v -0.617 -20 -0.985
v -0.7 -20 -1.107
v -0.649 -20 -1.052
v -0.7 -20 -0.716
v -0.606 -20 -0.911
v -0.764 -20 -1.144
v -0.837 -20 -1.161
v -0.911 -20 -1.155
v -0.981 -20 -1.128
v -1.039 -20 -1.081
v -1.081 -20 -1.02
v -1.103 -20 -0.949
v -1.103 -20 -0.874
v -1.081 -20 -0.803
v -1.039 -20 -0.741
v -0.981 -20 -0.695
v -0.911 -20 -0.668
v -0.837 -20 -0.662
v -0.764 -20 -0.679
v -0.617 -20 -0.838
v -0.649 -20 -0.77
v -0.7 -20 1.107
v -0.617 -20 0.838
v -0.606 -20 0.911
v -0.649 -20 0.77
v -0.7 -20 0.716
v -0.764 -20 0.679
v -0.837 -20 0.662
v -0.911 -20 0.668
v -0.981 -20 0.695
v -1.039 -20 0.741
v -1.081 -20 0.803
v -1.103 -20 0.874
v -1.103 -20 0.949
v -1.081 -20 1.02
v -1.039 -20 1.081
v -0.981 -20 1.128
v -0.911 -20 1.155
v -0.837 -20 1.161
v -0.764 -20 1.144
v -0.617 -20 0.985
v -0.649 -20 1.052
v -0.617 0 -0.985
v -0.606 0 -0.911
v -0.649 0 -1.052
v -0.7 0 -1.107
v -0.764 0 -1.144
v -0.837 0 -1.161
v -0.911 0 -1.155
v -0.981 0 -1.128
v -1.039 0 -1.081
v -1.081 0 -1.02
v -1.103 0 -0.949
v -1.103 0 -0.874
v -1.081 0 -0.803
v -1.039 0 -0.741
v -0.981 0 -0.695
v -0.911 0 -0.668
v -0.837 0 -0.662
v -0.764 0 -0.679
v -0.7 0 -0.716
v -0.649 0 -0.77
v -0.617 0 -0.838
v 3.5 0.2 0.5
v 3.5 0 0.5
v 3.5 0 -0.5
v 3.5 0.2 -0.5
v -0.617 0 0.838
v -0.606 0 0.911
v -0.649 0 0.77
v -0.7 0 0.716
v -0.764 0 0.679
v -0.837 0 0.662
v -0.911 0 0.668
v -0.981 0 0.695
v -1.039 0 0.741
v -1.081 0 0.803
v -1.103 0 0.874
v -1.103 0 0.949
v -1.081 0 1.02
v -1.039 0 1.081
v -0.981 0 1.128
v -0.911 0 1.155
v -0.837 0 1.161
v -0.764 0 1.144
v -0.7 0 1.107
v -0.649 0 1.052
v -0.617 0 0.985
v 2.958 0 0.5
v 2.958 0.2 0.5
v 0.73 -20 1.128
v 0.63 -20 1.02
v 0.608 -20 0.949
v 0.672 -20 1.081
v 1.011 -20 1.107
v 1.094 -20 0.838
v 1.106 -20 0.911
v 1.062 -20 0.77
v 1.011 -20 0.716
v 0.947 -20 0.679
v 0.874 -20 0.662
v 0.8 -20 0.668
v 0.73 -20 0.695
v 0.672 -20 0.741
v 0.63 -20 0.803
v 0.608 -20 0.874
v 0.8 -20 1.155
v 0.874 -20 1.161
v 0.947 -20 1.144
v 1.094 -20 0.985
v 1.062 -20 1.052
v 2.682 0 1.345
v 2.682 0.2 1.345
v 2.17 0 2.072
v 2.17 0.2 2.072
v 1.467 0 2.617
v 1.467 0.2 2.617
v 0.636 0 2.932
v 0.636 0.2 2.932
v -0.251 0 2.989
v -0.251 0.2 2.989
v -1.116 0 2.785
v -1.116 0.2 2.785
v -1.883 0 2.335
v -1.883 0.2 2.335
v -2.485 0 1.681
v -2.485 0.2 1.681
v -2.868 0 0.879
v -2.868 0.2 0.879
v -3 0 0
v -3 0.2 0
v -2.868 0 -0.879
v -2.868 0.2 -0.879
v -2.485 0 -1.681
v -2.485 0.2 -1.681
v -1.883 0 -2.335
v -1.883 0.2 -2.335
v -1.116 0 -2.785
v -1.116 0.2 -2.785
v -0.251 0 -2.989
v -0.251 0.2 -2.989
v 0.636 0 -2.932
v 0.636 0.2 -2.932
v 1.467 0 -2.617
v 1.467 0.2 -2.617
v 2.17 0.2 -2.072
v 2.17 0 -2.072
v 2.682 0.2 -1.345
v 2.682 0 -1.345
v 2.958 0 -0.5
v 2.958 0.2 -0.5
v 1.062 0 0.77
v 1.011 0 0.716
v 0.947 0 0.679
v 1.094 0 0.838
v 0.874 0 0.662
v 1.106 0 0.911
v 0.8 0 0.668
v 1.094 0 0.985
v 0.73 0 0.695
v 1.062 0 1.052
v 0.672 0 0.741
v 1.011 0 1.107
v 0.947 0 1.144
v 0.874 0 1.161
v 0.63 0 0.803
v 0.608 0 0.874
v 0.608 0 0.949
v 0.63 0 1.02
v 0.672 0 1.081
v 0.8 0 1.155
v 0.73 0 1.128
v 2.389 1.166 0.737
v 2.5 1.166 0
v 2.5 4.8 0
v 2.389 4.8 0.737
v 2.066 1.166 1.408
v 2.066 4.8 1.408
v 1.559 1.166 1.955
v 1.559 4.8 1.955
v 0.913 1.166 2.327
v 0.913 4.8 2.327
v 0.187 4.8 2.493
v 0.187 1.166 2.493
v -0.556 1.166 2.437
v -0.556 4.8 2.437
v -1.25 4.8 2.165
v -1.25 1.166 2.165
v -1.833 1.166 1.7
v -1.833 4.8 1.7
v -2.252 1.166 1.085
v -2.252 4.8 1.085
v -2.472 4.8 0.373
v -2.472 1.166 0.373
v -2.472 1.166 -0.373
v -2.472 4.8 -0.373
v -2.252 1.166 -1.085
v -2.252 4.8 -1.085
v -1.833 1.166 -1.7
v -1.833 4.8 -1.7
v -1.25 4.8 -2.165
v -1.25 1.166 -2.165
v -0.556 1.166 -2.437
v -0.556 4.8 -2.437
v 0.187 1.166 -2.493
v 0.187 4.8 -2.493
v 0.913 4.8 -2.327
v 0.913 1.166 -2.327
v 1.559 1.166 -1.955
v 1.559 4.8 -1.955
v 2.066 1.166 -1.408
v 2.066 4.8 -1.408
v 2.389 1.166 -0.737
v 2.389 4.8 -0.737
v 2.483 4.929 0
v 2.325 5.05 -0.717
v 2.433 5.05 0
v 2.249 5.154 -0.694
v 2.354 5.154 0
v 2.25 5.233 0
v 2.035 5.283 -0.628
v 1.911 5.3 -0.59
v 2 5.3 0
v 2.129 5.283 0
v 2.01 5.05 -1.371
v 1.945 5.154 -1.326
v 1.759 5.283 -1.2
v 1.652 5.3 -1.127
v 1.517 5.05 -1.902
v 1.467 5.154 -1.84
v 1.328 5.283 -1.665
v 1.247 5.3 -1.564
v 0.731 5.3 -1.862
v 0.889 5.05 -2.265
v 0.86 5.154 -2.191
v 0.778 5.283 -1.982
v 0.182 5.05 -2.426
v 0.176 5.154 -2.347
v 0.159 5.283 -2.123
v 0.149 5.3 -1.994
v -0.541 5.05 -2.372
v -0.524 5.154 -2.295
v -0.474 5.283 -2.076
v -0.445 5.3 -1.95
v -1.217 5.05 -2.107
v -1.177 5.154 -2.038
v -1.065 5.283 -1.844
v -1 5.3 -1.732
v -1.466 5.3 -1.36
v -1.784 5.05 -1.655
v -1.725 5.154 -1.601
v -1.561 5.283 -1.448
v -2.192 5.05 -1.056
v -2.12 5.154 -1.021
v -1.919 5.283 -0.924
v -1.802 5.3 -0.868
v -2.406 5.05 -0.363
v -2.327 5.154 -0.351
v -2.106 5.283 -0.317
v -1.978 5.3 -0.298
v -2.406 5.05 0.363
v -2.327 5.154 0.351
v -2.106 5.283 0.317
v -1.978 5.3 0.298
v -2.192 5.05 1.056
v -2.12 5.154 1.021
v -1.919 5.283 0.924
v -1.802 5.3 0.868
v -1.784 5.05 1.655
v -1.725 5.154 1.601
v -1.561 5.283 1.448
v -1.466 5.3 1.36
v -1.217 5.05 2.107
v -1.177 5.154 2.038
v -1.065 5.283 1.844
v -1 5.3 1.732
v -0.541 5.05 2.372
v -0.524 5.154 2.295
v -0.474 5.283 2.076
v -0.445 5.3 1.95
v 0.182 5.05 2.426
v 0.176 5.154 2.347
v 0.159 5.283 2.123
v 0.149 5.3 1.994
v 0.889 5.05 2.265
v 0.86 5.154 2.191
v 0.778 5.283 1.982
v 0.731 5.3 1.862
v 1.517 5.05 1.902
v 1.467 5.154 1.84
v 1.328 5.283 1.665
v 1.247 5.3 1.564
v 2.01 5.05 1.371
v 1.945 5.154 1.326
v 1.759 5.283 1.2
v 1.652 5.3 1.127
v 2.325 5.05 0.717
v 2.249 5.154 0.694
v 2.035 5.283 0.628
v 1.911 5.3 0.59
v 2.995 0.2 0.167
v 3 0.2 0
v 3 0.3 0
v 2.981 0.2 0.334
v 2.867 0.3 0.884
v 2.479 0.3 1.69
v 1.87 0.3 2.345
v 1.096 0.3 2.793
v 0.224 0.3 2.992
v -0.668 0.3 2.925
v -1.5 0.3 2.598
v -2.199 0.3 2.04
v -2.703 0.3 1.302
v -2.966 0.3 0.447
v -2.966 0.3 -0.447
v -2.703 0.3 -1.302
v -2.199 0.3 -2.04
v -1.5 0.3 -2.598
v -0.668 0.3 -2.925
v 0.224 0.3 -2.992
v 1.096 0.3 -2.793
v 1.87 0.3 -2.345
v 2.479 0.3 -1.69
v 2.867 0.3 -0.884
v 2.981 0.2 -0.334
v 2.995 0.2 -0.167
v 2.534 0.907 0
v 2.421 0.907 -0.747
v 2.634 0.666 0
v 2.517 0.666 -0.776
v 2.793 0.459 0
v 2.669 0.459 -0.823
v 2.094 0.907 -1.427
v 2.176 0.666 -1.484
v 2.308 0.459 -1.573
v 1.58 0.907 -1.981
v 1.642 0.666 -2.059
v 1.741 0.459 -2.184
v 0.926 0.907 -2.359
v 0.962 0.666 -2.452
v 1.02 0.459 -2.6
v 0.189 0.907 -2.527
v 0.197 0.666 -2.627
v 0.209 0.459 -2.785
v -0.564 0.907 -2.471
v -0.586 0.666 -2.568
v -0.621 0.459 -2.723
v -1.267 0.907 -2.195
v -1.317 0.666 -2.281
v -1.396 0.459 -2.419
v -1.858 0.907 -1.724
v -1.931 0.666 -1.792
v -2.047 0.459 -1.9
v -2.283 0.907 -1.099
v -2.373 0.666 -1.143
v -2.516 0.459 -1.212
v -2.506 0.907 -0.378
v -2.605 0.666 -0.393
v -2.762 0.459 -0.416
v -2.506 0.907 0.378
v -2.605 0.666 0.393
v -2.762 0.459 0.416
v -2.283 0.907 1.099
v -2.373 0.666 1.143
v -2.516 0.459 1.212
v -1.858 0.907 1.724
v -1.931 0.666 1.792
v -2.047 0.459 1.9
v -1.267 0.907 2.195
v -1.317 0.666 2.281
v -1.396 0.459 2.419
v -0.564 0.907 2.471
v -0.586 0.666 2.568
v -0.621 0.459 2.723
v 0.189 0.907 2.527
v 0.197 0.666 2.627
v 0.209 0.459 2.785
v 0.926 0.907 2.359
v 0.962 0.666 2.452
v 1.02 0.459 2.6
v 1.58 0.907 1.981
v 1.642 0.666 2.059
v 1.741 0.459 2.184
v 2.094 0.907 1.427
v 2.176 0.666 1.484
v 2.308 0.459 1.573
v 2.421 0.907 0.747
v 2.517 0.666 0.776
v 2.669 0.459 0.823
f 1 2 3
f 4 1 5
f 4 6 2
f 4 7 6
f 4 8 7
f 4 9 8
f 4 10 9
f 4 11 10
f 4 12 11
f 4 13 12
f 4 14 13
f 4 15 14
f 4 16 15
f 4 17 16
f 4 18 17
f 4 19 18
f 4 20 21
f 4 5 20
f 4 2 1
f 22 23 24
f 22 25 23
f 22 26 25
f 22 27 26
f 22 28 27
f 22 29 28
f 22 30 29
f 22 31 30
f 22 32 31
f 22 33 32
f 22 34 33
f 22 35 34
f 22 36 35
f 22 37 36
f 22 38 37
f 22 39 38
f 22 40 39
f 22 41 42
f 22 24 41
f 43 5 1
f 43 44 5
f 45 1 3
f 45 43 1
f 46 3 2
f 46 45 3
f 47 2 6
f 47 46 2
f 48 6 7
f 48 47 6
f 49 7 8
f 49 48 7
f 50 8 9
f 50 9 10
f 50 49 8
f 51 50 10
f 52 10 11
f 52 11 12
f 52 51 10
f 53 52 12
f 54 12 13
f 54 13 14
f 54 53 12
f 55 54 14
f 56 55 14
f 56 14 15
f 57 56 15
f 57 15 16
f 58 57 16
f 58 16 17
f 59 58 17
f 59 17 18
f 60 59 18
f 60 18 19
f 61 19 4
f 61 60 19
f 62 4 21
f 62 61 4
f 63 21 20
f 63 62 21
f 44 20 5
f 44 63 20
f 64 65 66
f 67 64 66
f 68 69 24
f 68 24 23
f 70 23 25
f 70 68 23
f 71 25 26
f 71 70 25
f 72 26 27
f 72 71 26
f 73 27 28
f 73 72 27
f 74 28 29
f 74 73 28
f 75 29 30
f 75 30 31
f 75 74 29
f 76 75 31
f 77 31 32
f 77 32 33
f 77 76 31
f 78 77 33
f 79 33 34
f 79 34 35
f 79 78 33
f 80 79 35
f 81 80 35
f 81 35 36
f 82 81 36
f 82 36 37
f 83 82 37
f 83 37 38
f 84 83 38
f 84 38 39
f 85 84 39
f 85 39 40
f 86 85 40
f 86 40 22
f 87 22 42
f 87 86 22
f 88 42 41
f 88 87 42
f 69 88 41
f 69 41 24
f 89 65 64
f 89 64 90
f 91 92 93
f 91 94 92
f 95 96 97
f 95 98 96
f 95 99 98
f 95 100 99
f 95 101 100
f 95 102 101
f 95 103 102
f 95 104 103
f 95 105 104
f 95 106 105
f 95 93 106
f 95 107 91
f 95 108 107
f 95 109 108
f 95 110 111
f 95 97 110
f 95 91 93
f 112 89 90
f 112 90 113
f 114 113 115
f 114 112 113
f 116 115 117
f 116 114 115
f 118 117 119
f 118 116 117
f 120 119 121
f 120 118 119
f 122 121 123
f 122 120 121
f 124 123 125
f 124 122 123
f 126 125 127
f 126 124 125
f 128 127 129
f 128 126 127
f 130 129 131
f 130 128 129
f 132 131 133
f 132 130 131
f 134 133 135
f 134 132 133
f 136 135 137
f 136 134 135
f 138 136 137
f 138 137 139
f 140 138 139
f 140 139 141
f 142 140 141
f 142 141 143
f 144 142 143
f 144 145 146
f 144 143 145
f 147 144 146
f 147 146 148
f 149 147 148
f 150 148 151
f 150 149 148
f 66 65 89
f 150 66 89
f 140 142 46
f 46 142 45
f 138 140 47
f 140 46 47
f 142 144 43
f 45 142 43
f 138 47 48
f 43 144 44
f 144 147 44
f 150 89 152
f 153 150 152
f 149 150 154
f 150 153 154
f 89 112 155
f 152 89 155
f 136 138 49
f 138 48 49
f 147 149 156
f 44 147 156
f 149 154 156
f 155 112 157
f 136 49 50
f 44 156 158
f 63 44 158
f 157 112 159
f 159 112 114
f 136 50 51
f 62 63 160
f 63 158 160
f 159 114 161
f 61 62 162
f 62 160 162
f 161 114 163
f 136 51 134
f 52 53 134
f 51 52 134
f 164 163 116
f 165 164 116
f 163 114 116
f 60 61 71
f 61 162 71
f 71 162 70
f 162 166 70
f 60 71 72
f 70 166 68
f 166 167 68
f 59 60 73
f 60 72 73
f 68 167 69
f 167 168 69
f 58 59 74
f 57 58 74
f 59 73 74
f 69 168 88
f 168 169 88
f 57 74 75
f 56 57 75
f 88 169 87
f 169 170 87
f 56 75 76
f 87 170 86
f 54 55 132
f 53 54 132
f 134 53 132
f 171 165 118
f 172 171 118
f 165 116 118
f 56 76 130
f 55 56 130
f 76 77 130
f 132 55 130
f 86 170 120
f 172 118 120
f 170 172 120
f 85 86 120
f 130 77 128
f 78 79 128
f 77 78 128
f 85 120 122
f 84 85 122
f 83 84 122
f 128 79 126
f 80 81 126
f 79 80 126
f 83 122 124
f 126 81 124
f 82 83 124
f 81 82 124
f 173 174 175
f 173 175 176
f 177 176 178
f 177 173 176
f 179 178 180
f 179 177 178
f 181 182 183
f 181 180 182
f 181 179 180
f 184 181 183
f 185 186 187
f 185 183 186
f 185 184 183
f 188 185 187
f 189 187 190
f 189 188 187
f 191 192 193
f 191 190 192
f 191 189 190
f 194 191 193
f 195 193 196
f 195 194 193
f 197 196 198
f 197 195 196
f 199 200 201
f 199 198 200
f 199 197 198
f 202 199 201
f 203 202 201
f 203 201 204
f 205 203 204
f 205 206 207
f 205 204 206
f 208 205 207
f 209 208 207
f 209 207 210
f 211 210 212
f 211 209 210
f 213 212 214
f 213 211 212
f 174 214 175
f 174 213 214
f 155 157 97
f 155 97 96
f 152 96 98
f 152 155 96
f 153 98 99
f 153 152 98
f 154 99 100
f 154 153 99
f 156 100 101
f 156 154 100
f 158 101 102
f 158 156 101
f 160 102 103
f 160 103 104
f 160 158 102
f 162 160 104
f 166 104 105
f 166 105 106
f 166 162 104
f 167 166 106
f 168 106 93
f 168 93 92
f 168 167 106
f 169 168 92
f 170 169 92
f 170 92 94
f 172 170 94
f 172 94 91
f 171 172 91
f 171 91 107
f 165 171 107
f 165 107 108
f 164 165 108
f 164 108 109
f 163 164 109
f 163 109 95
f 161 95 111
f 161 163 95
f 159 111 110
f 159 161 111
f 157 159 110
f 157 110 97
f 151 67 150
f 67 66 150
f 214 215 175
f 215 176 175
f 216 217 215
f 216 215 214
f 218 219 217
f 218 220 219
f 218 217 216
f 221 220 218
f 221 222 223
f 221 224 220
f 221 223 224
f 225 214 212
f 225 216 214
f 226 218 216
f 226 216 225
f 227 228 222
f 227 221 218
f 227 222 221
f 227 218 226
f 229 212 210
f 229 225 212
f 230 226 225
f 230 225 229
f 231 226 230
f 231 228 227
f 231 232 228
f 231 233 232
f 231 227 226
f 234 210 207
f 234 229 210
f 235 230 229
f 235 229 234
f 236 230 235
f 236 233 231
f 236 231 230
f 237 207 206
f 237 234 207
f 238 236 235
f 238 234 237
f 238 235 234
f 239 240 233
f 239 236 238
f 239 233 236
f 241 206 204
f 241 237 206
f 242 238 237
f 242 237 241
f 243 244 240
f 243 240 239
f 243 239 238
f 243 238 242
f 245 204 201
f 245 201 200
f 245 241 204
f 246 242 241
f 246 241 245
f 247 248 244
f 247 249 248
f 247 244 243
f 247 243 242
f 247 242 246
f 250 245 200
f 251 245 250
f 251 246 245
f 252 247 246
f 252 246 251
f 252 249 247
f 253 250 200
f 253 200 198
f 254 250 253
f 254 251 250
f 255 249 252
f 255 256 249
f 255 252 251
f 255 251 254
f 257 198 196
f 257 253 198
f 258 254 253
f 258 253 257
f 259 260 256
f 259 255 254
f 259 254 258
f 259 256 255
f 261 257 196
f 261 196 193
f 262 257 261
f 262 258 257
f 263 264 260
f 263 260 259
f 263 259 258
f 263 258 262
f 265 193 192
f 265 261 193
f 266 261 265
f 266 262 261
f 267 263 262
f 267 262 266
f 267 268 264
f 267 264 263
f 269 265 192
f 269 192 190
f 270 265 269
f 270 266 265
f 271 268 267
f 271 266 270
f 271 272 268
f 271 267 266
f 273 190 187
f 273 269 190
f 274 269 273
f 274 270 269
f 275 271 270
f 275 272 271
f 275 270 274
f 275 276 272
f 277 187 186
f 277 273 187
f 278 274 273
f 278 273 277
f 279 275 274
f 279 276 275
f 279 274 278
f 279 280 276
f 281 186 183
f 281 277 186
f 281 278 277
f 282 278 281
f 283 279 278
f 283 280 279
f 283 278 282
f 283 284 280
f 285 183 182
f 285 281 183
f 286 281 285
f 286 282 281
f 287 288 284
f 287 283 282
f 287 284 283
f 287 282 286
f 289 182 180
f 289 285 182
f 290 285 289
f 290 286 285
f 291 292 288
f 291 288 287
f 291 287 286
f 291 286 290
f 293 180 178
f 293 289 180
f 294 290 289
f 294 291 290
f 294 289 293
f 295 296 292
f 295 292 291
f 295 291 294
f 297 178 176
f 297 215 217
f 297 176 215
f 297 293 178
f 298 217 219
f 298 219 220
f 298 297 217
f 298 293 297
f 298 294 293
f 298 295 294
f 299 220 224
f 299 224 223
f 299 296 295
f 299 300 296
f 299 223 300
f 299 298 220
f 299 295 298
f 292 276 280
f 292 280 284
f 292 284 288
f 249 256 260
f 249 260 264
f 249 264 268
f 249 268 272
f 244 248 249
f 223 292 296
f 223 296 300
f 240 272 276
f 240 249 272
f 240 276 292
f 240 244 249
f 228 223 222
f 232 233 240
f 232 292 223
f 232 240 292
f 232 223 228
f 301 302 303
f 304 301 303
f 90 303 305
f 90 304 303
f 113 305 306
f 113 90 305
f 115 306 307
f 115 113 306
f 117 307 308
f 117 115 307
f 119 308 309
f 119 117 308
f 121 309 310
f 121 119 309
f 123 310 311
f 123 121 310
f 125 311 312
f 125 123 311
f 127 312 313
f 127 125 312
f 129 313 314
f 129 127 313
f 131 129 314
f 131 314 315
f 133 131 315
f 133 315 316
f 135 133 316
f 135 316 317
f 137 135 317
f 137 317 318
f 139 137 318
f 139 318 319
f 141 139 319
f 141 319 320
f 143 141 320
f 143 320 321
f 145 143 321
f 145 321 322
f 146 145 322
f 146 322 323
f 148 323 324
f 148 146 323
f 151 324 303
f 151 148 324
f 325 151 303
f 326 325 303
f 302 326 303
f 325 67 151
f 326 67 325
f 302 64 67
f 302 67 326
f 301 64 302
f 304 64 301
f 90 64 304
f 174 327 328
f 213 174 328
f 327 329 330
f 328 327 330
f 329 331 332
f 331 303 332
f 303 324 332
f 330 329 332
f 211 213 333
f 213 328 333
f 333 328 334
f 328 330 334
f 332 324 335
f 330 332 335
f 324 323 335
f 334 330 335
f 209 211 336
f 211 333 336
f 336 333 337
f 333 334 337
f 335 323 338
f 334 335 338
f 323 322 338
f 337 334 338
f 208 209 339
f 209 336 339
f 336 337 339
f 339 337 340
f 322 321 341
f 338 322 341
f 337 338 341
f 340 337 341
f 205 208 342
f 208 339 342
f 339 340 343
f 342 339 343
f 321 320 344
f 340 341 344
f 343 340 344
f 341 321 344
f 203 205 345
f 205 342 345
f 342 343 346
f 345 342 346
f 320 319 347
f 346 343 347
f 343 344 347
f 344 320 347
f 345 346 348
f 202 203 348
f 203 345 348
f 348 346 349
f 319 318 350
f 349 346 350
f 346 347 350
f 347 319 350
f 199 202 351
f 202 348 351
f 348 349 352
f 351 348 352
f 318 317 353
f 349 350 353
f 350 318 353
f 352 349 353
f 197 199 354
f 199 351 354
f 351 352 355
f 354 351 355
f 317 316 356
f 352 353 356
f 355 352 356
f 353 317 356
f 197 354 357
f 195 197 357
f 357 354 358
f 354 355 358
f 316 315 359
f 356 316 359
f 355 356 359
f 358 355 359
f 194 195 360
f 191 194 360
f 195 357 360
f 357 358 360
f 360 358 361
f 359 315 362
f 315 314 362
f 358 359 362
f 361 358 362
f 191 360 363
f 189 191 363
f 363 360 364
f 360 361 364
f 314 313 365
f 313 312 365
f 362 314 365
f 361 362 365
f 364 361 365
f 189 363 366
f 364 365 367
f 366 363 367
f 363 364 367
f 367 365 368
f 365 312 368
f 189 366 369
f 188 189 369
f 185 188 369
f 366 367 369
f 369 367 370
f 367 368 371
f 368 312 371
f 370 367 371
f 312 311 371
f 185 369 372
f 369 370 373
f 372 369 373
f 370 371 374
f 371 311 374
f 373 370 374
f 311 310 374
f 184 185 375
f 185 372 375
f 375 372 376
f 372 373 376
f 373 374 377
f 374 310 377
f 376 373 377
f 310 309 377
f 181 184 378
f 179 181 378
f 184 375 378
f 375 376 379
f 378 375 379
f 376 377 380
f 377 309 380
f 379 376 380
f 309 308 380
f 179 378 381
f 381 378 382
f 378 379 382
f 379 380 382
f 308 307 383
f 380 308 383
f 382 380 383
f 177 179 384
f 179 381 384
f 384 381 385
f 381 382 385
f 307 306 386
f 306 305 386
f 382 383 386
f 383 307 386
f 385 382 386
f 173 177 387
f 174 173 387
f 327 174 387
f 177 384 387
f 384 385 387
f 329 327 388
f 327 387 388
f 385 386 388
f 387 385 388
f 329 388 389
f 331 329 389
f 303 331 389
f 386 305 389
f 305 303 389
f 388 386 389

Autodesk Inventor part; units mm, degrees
ref_plane "YZ Plane" through (0, 0, 0) normal (1, 0, 0) x (0, 1, 0)
ref_plane "XZ Plane" through (0, 0, 0) normal (0, 1, 0) x (-1, 0, 0)
ref_plane "XY Plane" through (0, 0, 0) normal (0, 0, 1) x (1, 0, 0)
sketch "Sketch1" plane through (0, 0, 0) normal (0, 1, 0) x (-1, 0, 0)
  arc A0 (-2.958, -0.5) -> (-2.958, 0.5) centre (0, 0) ccw
  line L0 (-3.5, 0) -> (-3.5, -0.5)
  line L1 (-3.5, -0.5) -> (-3, -0.5)
  line L2 (-3, -0.5) -> (-2.958, -0.5)
  line L3 (-3.5, 0) -> (-3.5, 0.5)
  line L4 (-3.5, 0.5) -> (-2.958, 0.5)
  dimension "d0" = 6
  dimension "d1" = 0.5
  dimension "d2" = 0.5
  dimension "d3" = 0.5
extrude "Extrusion1" add sketch "Sketch1" along normal blind 0.2
sketch "Sketch2" plane through (0, 0.2, 0) normal (0, 1, 0) x (1, 0, 0)
  circle A0 centre (0, 0) radius 2.9999
extrude "Extrusion2" add sketch "Sketch2" along normal blind 0.1
sketch "Sketch3" plane through (0, 0.3, 0) normal (0, 1, 0) x (1, 0, 0)
  circle A0 centre (0, 0) radius 2.5
  dimension "d8" = 5
extrude "Extrusion3" add sketch "Sketch3" along normal blind 5
fillet "Fillet1" radius 0.5 1 edges at (-2.5, 5.3, 0)
fillet "Fillet2" radius 1 1 edges at (-2.5, 0.3, 0)
sketch "Sketch4" plane through (0, 0, 0) normal (0, -1, 0) x (1, 0, 0)
  circle A0 centre (0, 0) radius 1.25
  circle A1 centre (0.8555, -0.9113) radius 0.25
  circle A2 centre (0.8555, 0.9113) radius 0.25
  circle A3 centre (-0.8555, -0.9113) radius 0.25
  circle A4 centre (-0.8555, 0.9113) radius 0.25
  dimension "d13" = 2.5
  dimension "d14" = 0.5
  dimension "d16" = 0.5
  dimension "d17" = 0.5
  dimension "d18" = 0.5
extrude "Extrusion4" add sketch "Sketch4" along normal blind 20 contours A2 A0 | A0 A2 | A4 A0 | A0 A4 | A3 A0 | A0 A3
equation "\"BendRadius\" = Thickness"
equation "\"BendReliefWidth\" = Thickness"
equation "\"BendReliefDepth\" = 0.5 * Thickness"
equation "\"CornerReliefSize\" = 4 * Thickness"
equation "\"MinimumRemnant\" = 2 * Thickness"
equation "\"TransitionRadius\" = BendRadius"
equation "\"JacobiRadiusSize\" = BendRadius"
equation "\"GapSize\" = Thickness"
equation "\"Thickness\" = 3.048"
